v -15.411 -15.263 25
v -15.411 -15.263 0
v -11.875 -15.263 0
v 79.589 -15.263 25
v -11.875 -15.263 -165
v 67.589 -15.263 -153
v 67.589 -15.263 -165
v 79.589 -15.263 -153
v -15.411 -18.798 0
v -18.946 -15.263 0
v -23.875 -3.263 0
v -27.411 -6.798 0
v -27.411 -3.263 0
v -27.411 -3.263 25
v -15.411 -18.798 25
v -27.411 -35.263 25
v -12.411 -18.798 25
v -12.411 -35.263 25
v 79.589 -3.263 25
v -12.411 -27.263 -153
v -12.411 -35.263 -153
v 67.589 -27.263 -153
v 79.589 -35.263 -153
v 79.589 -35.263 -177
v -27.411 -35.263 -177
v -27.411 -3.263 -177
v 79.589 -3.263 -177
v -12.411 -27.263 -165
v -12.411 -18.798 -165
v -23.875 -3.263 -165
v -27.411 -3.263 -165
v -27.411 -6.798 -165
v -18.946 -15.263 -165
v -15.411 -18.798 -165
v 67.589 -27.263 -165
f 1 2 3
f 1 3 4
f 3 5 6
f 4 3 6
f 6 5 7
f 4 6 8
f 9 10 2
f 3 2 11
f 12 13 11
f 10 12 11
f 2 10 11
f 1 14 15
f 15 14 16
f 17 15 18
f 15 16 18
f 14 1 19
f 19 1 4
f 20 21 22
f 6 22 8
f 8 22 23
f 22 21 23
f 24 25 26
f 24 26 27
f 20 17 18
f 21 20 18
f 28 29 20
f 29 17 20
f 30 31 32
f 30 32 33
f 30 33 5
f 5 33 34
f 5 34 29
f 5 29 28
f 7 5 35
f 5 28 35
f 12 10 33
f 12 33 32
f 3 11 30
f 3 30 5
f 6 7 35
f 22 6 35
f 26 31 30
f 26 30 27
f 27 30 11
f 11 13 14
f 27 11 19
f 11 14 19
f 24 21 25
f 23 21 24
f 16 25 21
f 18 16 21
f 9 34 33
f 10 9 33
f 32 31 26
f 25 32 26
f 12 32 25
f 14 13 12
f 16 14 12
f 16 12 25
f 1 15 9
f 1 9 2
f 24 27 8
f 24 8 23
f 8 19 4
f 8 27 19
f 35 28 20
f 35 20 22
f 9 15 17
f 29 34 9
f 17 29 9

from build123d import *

# Parameters (mm, degrees)
F1_DEPTH = 25
F2_DEPTH = 165
F4_DEPTH = 190
F5_W     = 12
F5_H     = 8
F5_H_2   = 12
F6_DEPTH = 12
F7_W     = 107
F7_H     = 32
F8_DEPTH = 12


with BuildPart() as f1:
    # F0 (on Top) → F1 (new body)
    with BuildSketch(Plane.XY):
        Polygon((-15.4107665035, -11.7272357842), (-11.8752325976, -15.2627696901), (79.5892334965, -15.2627696901), (79.5892334965, -3.2627696901), (-15.4107665035, -3.2627696901), align=None)
        Polygon((-23.8752325976, -3.2627696901), (-15.4107665035, -11.7272357842), (-15.4107665035, -3.2627696901), align=None)
        Polygon((-18.9463004094, -15.2627696901), (-15.4107665035, -15.2627696901), (-27.4107665035, -3.2627696901), (-27.4107665035, -6.7983035961), align=None)
        Polygon((-27.4107665035, -15.2627696901), (-18.9463004094, -15.2627696901), (-27.4107665035, -6.7983035961), align=None)
        Polygon((-15.4107665035, -18.7983035961), (-18.9463004094, -15.2627696901), (-27.4107665035, -15.2627696901), (-27.4107665035, -35.2627696901), (-15.4107665035, -35.2627696901), align=None)
        Polygon((-27.4107665035, -3.2627696901), (-15.4107665035, -15.2627696901), (-15.4107665035, -11.7272357842), (-23.8752325976, -3.2627696901), align=None)
        Polygon((-15.4107665035, -11.7272357842), (-15.4107665035, -15.2627696901), (-11.8752325976, -15.2627696901), align=None)
        Polygon((-15.4107665035, -18.7983035961), (-15.4107665035, -15.2627696901), (-18.9463004094, -15.2627696901), align=None)
    extrude(amount=F1_DEPTH)

    # F0 (on Top) → F2 (join)
    with BuildSketch(Plane.XY):
        Polygon((-15.4107665035, -18.7983035961), (-18.9463004094, -15.2627696901), (-27.4107665035, -15.2627696901), (-27.4107665035, -35.2627696901), (-15.4107665035, -35.2627696901), align=None)
        Polygon((-23.8752325976, -3.2627696901), (-15.4107665035, -11.7272357842), (-15.4107665035, -3.2627696901), align=None)
        Polygon((-15.4107665035, -11.7272357842), (-11.8752325976, -15.2627696901), (79.5892334965, -15.2627696901), (79.5892334965, -3.2627696901), (-15.4107665035, -3.2627696901), align=None)
        Polygon((-27.4107665035, -15.2627696901), (-18.9463004094, -15.2627696901), (-27.4107665035, -6.7983035961), align=None)
    extrude(amount=-F2_DEPTH)

    # F3 (on face) → F4 (join, through all)
    with BuildSketch(Plane(origin=(0, 0, -165), x_dir=(1, 0, 0), z_dir=(0, 0, -1))):
        Polygon((-15.4107665035, 30.7983035961), (-15.4107665035, 18.7983035961), (-12.4107665035, 18.7983035961), (-12.4107665035, 30.7983035961), (-12.4107665035, 35.2627696901), (-15.4107665035, 35.2627696901), align=None)
    extrude(amount=-F4_DEPTH)

    # F5 (on face) → F6 (join)
    with BuildSketch(Plane(origin=(0, 0, -165), x_dir=(1, 0, 0), z_dir=(0, 0, -1))):
        Polygon((-12.4107665035, 35.2627696901), (-12.4107665035, 30.7983035961), (-12.4107665035, 27.2627696901), (67.5892334965, 27.2627696901), (67.5892334965, 35.2627696901), align=None)
        with Locations((73.5892334965, 31.2627696901)):
            Rectangle(F5_W, F5_H)
        with Locations((73.5892334965, 21.2627696901)):
            Rectangle(F5_W, F5_H_2)
        Polygon((79.5892334965, 15.2627696901), (67.5892334965, 15.2627696901), (-11.8752325976, 15.2627696901), (-23.8752325976, 3.2627696901), (79.5892334965, 3.2627696901), align=None)
    extrude(amount=-F6_DEPTH)

    # F7 (on face) → F8 (join)
    with BuildSketch(Plane(origin=(0, 0, -165), x_dir=(1, 0, 0), z_dir=(0, 0, -1))):
        with Locations((26.0892334965, 19.2627696901)):
            Rectangle(F7_W, F7_H)
    extrude(amount=F8_DEPTH)


solid = f1.part
